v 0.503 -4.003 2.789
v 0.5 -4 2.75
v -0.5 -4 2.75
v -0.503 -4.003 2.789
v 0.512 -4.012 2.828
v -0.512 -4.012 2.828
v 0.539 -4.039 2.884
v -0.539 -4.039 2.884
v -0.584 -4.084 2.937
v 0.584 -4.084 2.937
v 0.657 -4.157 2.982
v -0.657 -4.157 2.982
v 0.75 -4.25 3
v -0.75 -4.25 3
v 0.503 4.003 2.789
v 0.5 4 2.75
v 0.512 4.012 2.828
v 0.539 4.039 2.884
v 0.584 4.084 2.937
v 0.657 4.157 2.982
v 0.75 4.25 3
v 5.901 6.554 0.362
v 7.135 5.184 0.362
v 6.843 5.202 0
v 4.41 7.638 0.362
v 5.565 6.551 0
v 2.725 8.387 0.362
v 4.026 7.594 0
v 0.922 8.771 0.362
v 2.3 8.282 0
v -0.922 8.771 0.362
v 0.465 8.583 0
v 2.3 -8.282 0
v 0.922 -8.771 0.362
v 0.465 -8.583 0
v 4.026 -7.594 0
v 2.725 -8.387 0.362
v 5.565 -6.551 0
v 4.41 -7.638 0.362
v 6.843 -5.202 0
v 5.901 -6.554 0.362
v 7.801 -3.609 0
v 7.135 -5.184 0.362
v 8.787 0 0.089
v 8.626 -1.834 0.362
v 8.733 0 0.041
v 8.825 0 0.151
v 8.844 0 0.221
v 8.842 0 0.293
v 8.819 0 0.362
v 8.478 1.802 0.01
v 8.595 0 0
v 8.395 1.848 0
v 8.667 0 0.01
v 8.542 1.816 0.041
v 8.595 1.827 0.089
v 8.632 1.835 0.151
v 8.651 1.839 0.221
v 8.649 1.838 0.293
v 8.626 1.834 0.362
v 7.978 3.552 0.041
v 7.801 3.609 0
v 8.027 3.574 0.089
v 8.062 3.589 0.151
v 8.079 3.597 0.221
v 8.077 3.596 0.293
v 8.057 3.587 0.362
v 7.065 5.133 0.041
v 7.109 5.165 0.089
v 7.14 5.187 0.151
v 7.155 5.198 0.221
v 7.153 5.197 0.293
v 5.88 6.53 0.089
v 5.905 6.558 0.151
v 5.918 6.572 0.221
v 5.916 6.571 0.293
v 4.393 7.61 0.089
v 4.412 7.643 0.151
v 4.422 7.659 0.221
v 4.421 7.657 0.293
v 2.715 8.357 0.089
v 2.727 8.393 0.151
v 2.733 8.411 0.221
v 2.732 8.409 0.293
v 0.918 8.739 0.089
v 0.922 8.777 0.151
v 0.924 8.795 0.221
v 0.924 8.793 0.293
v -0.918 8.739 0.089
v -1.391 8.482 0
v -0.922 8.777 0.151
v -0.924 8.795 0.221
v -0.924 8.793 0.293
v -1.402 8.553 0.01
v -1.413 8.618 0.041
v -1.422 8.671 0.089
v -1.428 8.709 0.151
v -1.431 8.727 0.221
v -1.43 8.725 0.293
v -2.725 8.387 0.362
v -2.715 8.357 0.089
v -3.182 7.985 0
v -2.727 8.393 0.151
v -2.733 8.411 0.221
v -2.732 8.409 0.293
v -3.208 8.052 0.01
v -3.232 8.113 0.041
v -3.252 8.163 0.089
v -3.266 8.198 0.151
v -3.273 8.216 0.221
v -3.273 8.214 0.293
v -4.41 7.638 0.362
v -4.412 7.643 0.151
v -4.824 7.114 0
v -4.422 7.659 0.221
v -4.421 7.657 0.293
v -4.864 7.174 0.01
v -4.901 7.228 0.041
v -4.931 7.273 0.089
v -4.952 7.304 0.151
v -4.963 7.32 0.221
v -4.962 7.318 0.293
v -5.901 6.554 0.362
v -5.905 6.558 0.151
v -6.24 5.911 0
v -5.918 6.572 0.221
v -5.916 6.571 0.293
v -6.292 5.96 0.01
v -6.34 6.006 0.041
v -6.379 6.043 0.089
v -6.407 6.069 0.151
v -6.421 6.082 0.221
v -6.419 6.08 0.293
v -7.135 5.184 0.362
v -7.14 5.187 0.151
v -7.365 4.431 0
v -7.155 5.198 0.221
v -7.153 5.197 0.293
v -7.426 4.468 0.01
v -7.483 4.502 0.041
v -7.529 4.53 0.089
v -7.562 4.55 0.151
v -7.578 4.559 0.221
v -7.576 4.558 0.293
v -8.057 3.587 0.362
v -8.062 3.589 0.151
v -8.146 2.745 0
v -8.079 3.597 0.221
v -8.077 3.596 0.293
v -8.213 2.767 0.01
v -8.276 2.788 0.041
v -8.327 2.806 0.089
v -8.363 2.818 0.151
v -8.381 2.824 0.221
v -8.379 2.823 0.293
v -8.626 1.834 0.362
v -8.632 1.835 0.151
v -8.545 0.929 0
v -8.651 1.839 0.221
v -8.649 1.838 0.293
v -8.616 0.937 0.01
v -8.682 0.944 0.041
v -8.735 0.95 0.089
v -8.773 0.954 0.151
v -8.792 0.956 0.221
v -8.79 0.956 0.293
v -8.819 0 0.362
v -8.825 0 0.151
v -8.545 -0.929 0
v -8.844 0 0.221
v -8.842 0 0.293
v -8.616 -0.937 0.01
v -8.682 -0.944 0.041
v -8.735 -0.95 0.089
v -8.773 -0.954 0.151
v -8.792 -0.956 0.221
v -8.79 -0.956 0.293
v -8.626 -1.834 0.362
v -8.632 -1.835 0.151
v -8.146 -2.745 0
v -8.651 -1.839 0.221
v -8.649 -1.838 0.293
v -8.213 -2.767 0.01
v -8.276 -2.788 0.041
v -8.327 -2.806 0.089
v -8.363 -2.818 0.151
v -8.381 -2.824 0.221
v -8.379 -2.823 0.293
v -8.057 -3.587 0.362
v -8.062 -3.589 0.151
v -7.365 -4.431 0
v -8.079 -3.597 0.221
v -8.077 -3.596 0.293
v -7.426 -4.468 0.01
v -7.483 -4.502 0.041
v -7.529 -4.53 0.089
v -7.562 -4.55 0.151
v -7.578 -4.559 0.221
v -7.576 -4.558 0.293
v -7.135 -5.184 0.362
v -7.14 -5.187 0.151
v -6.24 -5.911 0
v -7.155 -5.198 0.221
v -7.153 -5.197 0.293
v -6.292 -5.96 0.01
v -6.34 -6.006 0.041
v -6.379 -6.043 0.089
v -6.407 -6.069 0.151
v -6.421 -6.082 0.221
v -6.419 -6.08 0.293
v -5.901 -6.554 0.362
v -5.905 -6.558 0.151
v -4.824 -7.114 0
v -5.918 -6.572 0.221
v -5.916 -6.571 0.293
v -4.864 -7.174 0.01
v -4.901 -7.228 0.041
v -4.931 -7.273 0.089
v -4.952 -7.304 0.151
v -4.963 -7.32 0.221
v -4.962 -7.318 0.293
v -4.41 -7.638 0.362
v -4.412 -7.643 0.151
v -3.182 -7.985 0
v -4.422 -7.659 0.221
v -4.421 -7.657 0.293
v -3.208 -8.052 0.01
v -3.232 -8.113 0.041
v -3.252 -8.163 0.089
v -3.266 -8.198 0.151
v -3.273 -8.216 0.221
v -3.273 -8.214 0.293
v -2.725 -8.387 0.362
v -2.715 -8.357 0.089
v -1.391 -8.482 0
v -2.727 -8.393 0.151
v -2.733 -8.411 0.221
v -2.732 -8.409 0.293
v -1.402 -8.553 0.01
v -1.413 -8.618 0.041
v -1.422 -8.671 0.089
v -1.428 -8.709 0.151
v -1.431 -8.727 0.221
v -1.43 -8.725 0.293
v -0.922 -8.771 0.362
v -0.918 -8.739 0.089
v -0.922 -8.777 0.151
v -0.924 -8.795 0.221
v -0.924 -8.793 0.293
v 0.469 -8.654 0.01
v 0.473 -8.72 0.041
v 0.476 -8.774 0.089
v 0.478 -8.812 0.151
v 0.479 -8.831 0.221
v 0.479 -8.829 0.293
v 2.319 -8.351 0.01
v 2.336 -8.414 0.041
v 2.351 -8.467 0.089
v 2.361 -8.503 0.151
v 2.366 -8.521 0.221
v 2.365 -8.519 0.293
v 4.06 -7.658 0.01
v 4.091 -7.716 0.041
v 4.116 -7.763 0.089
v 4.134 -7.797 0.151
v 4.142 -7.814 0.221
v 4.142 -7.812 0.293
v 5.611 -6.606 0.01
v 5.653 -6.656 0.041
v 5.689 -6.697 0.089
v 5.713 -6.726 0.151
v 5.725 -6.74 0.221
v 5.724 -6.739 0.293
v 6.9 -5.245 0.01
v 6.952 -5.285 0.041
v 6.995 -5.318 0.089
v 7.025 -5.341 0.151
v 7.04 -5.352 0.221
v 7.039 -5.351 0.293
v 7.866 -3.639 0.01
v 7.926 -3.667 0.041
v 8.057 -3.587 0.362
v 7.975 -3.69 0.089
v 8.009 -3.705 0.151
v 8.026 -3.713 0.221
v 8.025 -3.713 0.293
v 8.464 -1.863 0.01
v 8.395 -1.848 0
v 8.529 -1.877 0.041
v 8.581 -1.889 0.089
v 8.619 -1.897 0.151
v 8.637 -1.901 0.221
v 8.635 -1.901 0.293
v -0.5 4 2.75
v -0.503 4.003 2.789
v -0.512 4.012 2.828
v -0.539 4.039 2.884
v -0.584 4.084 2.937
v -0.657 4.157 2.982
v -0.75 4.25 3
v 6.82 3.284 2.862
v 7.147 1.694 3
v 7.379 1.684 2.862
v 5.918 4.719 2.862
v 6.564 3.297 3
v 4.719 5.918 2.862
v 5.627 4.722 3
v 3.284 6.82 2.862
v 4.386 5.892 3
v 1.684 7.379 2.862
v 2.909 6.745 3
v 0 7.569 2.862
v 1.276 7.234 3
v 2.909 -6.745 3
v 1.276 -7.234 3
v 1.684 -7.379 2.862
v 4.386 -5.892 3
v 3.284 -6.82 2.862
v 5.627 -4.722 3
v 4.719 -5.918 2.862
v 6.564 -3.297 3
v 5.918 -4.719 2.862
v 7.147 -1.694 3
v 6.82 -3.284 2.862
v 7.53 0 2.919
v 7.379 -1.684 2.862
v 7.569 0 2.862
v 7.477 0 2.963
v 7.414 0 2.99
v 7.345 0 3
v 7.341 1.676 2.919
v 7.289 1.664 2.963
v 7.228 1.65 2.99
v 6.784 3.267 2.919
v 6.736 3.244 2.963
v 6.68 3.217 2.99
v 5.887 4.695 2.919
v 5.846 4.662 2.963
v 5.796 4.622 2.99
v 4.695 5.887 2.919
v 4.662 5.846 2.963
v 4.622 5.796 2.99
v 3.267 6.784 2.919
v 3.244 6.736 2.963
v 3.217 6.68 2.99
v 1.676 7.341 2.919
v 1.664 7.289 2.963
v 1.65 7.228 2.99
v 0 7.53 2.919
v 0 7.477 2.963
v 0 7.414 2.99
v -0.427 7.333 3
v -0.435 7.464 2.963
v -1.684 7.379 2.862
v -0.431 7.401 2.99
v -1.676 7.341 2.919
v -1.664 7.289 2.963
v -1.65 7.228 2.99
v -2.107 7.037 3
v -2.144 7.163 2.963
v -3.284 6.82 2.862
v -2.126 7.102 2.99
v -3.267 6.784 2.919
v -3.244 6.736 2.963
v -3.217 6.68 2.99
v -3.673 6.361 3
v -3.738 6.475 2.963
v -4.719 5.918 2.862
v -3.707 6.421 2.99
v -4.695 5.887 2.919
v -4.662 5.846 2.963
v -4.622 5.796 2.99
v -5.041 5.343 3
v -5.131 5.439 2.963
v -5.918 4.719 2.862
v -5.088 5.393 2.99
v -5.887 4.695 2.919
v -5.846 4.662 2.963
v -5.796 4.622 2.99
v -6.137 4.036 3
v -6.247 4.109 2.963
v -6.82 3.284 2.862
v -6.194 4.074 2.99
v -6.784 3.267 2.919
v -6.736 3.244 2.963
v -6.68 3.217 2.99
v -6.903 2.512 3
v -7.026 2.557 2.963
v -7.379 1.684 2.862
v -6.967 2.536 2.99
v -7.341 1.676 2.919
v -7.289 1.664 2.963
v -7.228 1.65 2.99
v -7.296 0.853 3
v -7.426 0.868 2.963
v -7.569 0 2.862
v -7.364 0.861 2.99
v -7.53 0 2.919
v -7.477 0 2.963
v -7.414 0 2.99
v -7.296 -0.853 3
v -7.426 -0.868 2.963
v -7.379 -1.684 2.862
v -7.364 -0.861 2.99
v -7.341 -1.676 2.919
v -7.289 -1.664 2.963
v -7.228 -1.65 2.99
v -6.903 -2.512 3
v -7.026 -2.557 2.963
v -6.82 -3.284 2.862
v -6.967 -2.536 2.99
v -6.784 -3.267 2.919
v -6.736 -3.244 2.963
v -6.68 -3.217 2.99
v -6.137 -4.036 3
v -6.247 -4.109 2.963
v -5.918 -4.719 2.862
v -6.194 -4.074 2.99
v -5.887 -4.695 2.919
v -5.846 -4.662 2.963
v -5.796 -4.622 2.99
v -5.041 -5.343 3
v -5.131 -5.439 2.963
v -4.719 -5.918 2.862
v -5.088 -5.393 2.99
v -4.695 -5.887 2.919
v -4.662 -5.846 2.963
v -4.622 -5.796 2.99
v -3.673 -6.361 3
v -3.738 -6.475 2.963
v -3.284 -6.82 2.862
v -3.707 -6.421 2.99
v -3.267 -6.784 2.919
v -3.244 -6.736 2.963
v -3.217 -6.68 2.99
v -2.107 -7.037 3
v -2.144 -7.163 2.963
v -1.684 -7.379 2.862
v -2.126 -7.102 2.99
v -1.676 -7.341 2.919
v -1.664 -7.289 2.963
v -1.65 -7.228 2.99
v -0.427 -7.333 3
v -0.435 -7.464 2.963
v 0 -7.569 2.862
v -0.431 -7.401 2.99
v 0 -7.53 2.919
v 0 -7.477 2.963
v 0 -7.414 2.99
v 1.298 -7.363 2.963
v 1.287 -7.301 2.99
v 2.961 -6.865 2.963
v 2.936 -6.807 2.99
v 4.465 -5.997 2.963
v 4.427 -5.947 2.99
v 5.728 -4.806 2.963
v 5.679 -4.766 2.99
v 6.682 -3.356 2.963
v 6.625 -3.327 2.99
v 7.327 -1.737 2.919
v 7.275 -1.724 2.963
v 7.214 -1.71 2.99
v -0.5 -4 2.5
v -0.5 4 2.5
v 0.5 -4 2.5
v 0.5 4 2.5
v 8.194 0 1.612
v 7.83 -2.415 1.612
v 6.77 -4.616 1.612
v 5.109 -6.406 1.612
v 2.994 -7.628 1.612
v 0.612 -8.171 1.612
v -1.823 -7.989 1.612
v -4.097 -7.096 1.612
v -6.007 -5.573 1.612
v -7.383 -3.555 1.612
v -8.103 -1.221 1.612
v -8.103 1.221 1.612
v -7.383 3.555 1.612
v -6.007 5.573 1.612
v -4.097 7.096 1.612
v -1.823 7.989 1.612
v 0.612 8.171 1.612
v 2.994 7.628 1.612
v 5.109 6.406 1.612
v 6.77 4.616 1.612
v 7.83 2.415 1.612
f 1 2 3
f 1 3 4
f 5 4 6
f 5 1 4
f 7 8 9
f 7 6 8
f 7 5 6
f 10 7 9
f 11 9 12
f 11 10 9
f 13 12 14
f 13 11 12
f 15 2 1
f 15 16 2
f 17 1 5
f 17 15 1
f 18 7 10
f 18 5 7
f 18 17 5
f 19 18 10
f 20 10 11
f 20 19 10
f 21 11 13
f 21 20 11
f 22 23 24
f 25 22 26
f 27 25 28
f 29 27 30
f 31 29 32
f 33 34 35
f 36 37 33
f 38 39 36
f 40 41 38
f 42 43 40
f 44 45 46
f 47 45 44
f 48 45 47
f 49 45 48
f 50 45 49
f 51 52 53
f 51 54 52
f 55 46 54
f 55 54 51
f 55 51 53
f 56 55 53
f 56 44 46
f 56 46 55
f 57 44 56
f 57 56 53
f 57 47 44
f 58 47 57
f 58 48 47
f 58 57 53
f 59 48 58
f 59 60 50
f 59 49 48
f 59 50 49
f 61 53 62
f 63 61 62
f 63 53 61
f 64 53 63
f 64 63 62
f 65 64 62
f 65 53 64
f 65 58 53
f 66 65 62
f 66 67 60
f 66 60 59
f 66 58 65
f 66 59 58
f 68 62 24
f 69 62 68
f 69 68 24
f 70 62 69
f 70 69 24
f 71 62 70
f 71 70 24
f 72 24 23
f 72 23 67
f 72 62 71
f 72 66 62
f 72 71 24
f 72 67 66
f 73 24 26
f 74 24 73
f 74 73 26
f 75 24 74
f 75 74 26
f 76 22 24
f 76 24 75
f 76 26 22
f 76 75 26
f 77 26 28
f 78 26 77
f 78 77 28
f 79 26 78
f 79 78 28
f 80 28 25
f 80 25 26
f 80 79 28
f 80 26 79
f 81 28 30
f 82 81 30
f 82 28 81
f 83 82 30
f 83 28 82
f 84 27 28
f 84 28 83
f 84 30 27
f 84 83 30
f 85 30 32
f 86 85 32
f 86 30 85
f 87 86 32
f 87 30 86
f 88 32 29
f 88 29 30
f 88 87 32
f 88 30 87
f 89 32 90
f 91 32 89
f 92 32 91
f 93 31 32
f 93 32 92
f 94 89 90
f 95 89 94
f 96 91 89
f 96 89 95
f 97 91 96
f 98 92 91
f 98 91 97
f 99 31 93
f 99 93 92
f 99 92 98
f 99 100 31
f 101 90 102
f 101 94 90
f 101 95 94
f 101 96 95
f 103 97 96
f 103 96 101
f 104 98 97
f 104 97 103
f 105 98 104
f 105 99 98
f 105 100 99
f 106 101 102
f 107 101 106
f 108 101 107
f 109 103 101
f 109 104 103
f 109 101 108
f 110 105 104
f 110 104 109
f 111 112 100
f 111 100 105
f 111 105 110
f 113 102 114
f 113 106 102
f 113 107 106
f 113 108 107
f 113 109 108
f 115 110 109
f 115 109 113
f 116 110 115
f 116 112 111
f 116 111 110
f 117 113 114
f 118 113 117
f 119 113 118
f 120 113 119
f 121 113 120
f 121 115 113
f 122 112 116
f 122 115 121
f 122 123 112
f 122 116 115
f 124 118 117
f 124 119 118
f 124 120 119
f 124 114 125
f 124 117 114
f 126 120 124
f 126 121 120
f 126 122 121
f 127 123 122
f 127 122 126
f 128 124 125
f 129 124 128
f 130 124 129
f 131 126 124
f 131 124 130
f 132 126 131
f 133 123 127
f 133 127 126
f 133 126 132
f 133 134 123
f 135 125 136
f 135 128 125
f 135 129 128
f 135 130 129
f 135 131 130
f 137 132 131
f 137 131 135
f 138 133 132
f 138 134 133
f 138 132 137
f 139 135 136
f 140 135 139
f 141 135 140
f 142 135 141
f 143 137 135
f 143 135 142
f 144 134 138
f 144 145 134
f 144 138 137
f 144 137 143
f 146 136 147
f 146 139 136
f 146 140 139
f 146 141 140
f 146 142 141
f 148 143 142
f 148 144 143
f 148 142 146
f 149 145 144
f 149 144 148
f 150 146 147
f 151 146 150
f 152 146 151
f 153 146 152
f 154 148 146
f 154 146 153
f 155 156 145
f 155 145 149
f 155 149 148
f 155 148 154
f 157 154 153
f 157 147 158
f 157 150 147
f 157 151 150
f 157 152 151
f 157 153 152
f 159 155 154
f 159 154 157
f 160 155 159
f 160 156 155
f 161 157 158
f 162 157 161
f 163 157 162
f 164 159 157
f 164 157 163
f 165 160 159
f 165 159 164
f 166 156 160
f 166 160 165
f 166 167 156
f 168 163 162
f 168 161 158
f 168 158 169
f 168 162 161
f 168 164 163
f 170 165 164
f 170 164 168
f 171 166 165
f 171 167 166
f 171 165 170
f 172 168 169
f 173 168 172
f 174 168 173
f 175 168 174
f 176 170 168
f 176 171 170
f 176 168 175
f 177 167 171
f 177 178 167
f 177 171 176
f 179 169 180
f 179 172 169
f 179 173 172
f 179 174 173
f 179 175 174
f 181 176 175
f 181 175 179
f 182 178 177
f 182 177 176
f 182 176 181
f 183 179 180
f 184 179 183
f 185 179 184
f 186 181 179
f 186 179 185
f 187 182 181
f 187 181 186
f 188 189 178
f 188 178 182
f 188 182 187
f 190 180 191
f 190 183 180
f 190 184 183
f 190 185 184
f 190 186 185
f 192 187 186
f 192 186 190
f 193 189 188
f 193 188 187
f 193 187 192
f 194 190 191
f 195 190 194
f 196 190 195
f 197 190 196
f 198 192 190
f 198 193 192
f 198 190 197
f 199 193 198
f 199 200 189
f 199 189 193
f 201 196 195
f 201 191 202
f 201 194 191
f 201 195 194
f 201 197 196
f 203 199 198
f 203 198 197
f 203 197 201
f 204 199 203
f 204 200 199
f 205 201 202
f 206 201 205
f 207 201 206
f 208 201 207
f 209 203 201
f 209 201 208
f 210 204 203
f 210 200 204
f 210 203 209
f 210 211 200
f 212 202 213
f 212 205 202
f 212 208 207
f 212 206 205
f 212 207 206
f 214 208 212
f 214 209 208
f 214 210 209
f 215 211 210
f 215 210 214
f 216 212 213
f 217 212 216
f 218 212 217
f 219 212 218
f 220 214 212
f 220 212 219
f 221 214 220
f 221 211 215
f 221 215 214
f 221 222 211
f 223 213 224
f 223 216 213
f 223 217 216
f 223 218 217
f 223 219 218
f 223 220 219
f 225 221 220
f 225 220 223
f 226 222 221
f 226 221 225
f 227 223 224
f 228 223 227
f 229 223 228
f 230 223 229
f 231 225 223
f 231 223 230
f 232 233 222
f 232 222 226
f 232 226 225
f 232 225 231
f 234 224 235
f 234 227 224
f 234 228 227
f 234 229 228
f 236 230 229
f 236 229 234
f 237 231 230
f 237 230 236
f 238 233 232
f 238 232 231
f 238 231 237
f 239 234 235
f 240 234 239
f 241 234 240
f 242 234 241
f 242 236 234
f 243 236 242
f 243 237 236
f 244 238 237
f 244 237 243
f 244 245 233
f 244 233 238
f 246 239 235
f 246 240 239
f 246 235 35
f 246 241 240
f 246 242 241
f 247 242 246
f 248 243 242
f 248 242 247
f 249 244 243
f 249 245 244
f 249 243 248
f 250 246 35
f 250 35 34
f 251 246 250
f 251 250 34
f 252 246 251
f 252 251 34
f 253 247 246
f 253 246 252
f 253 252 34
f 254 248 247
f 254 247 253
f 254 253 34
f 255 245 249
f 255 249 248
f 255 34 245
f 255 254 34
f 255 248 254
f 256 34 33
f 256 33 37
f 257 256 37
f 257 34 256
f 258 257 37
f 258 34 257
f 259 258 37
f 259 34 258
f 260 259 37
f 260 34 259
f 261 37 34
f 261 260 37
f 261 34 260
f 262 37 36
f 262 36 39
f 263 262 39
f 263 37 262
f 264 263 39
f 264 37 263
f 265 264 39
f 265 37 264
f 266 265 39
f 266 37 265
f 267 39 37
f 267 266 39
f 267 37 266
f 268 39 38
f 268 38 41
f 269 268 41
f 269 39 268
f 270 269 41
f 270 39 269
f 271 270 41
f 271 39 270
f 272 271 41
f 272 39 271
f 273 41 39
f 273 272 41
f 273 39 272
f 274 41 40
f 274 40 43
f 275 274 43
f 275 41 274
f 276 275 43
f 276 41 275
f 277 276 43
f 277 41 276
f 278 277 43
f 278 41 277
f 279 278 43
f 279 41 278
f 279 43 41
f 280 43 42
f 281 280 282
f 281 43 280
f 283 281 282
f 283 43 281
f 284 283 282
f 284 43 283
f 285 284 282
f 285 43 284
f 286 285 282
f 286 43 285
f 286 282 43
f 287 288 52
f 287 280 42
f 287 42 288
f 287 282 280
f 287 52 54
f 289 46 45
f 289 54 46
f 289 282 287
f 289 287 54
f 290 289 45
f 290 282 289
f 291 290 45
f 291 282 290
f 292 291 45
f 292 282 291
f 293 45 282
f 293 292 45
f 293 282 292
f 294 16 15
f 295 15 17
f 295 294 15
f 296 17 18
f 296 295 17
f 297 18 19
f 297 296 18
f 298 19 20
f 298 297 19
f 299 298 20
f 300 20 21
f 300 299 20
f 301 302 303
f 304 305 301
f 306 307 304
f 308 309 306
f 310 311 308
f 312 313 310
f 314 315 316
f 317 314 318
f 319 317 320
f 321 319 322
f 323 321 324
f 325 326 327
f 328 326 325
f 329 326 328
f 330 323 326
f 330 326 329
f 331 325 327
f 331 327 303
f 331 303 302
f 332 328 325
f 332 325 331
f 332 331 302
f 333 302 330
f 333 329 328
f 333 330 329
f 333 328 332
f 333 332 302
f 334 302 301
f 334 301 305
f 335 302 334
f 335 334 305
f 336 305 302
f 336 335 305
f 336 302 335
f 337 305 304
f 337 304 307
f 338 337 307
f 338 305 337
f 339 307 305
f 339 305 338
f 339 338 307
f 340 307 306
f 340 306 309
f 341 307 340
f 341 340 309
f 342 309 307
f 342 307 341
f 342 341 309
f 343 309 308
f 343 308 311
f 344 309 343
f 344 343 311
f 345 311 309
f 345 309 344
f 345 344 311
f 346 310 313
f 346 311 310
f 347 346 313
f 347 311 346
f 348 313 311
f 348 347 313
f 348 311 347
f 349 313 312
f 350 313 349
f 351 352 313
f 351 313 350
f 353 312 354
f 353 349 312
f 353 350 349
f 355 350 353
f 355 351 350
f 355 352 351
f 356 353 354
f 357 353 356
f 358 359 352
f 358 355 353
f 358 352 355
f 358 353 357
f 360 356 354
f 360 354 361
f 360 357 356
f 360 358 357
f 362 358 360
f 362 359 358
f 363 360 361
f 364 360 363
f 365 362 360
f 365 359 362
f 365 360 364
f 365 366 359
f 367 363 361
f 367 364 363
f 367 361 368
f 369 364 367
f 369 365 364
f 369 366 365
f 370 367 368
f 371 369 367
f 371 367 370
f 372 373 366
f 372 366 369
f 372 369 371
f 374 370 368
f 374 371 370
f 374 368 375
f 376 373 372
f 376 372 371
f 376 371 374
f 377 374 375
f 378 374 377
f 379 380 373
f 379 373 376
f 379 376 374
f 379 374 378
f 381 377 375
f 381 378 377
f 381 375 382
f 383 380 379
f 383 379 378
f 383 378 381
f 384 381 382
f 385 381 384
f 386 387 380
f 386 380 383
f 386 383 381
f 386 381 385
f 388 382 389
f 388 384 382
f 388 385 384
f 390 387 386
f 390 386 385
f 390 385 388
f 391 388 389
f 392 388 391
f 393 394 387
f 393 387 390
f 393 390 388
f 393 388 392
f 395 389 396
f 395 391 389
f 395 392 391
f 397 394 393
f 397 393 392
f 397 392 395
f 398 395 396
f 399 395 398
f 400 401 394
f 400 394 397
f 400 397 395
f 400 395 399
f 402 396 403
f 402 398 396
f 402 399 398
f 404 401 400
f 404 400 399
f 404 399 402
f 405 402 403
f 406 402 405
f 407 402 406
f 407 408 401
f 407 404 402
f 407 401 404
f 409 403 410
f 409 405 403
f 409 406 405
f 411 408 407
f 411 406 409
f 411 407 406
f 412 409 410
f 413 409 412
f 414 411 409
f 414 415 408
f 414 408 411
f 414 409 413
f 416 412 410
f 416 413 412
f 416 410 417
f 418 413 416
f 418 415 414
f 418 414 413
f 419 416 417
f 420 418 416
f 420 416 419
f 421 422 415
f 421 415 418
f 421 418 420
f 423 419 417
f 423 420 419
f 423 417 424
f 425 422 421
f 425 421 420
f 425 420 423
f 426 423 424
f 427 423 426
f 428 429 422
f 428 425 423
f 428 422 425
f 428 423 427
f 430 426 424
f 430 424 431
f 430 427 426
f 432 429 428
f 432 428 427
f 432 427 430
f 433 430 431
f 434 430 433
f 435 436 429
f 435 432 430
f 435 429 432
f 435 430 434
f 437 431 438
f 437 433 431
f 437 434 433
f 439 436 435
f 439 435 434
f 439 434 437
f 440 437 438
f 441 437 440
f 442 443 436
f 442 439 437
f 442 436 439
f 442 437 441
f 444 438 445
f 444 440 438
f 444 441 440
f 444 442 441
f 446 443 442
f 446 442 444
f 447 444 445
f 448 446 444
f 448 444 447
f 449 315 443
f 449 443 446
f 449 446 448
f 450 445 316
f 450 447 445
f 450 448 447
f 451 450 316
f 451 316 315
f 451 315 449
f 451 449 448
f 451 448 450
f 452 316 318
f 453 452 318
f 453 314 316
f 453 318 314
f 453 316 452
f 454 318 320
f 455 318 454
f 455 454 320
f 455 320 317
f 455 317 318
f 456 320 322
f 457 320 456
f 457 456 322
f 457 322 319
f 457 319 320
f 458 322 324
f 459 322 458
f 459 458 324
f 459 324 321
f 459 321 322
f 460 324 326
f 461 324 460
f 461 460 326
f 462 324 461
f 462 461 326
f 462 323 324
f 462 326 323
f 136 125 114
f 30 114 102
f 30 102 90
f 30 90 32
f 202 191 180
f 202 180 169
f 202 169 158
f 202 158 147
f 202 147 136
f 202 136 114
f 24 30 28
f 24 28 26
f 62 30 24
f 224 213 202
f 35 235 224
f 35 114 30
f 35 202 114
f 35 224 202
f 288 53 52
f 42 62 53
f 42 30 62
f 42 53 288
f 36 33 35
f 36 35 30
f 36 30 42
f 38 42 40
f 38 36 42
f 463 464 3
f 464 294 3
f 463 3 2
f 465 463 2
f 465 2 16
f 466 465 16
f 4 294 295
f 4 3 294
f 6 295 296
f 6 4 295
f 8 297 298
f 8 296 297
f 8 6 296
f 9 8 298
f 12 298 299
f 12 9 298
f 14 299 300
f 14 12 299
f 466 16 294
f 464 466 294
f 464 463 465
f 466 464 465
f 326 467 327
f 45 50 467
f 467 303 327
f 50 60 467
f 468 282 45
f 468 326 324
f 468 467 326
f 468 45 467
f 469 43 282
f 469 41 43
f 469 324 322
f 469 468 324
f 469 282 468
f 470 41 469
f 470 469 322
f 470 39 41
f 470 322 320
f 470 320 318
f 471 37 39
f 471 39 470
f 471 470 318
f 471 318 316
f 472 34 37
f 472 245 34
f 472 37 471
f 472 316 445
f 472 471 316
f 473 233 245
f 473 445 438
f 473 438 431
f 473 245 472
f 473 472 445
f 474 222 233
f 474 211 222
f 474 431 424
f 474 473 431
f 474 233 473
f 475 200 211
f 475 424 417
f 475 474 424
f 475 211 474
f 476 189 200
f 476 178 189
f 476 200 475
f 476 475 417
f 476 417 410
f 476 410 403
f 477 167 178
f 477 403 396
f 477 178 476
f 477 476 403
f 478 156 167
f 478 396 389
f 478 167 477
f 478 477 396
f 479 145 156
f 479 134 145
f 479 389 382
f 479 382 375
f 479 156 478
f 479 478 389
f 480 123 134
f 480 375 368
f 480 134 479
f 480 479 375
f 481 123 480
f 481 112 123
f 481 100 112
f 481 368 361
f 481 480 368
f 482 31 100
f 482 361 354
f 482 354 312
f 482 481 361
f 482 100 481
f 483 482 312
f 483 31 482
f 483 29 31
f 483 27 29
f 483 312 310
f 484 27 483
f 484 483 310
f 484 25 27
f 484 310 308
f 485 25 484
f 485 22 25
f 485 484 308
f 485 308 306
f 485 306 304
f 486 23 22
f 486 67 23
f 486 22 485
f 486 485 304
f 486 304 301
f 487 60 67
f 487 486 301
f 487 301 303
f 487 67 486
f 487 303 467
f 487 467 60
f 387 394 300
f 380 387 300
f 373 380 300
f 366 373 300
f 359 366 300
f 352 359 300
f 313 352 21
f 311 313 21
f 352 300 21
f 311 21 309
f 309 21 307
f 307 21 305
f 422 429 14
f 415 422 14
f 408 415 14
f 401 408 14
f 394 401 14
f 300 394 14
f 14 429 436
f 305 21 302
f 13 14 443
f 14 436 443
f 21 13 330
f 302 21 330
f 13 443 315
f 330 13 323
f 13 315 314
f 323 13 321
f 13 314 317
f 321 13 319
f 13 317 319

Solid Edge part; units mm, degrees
sketch "Sketch1" plane through (0, 0, 0) normal (0, -1, 0) x (1, 0, 0)
  line L0 (0, 0) -> (9, 0)
  line L1 (9, 0) -> (7.5, 3)
  line L2 (7.5, 3) -> (0, 3)
  dimension "D1" = 9
  dimension "D2" = 3
  dimension "D3" = 7.5
revolve "RevolvedProtrusion1" add sketch "Sketch1" angle 360 about axis through (0, 0, 3) along (0, 0, -1)
sketch "Sketch2" plane through (0, 0, 3) normal (0, 0, 1) x (1, 0, 0)
  line L0 (-0.5, -4) -> (0.5, -4)
  line L1 (0.5, -4) -> (0.5, 4)
  line L2 (0.5, 4) -> (-0.5, 4)
  line L3 (-0.5, 4) -> (-0.5, -4)
  dimension "D1" = 1
  dimension "D2" = 8
extrude "Cutout1" cut sketch "Sketch2" against normal blind 0.5
fillet "main_rounds" radius 0.25 6 edges at (-9, 0, 0) (-7.5, 0, 3) (0.5, 0, 3) (0, -4, 3) (-0.5, 0, 3) (0, 4, 3)
properties material "Polyethylene, low density"
